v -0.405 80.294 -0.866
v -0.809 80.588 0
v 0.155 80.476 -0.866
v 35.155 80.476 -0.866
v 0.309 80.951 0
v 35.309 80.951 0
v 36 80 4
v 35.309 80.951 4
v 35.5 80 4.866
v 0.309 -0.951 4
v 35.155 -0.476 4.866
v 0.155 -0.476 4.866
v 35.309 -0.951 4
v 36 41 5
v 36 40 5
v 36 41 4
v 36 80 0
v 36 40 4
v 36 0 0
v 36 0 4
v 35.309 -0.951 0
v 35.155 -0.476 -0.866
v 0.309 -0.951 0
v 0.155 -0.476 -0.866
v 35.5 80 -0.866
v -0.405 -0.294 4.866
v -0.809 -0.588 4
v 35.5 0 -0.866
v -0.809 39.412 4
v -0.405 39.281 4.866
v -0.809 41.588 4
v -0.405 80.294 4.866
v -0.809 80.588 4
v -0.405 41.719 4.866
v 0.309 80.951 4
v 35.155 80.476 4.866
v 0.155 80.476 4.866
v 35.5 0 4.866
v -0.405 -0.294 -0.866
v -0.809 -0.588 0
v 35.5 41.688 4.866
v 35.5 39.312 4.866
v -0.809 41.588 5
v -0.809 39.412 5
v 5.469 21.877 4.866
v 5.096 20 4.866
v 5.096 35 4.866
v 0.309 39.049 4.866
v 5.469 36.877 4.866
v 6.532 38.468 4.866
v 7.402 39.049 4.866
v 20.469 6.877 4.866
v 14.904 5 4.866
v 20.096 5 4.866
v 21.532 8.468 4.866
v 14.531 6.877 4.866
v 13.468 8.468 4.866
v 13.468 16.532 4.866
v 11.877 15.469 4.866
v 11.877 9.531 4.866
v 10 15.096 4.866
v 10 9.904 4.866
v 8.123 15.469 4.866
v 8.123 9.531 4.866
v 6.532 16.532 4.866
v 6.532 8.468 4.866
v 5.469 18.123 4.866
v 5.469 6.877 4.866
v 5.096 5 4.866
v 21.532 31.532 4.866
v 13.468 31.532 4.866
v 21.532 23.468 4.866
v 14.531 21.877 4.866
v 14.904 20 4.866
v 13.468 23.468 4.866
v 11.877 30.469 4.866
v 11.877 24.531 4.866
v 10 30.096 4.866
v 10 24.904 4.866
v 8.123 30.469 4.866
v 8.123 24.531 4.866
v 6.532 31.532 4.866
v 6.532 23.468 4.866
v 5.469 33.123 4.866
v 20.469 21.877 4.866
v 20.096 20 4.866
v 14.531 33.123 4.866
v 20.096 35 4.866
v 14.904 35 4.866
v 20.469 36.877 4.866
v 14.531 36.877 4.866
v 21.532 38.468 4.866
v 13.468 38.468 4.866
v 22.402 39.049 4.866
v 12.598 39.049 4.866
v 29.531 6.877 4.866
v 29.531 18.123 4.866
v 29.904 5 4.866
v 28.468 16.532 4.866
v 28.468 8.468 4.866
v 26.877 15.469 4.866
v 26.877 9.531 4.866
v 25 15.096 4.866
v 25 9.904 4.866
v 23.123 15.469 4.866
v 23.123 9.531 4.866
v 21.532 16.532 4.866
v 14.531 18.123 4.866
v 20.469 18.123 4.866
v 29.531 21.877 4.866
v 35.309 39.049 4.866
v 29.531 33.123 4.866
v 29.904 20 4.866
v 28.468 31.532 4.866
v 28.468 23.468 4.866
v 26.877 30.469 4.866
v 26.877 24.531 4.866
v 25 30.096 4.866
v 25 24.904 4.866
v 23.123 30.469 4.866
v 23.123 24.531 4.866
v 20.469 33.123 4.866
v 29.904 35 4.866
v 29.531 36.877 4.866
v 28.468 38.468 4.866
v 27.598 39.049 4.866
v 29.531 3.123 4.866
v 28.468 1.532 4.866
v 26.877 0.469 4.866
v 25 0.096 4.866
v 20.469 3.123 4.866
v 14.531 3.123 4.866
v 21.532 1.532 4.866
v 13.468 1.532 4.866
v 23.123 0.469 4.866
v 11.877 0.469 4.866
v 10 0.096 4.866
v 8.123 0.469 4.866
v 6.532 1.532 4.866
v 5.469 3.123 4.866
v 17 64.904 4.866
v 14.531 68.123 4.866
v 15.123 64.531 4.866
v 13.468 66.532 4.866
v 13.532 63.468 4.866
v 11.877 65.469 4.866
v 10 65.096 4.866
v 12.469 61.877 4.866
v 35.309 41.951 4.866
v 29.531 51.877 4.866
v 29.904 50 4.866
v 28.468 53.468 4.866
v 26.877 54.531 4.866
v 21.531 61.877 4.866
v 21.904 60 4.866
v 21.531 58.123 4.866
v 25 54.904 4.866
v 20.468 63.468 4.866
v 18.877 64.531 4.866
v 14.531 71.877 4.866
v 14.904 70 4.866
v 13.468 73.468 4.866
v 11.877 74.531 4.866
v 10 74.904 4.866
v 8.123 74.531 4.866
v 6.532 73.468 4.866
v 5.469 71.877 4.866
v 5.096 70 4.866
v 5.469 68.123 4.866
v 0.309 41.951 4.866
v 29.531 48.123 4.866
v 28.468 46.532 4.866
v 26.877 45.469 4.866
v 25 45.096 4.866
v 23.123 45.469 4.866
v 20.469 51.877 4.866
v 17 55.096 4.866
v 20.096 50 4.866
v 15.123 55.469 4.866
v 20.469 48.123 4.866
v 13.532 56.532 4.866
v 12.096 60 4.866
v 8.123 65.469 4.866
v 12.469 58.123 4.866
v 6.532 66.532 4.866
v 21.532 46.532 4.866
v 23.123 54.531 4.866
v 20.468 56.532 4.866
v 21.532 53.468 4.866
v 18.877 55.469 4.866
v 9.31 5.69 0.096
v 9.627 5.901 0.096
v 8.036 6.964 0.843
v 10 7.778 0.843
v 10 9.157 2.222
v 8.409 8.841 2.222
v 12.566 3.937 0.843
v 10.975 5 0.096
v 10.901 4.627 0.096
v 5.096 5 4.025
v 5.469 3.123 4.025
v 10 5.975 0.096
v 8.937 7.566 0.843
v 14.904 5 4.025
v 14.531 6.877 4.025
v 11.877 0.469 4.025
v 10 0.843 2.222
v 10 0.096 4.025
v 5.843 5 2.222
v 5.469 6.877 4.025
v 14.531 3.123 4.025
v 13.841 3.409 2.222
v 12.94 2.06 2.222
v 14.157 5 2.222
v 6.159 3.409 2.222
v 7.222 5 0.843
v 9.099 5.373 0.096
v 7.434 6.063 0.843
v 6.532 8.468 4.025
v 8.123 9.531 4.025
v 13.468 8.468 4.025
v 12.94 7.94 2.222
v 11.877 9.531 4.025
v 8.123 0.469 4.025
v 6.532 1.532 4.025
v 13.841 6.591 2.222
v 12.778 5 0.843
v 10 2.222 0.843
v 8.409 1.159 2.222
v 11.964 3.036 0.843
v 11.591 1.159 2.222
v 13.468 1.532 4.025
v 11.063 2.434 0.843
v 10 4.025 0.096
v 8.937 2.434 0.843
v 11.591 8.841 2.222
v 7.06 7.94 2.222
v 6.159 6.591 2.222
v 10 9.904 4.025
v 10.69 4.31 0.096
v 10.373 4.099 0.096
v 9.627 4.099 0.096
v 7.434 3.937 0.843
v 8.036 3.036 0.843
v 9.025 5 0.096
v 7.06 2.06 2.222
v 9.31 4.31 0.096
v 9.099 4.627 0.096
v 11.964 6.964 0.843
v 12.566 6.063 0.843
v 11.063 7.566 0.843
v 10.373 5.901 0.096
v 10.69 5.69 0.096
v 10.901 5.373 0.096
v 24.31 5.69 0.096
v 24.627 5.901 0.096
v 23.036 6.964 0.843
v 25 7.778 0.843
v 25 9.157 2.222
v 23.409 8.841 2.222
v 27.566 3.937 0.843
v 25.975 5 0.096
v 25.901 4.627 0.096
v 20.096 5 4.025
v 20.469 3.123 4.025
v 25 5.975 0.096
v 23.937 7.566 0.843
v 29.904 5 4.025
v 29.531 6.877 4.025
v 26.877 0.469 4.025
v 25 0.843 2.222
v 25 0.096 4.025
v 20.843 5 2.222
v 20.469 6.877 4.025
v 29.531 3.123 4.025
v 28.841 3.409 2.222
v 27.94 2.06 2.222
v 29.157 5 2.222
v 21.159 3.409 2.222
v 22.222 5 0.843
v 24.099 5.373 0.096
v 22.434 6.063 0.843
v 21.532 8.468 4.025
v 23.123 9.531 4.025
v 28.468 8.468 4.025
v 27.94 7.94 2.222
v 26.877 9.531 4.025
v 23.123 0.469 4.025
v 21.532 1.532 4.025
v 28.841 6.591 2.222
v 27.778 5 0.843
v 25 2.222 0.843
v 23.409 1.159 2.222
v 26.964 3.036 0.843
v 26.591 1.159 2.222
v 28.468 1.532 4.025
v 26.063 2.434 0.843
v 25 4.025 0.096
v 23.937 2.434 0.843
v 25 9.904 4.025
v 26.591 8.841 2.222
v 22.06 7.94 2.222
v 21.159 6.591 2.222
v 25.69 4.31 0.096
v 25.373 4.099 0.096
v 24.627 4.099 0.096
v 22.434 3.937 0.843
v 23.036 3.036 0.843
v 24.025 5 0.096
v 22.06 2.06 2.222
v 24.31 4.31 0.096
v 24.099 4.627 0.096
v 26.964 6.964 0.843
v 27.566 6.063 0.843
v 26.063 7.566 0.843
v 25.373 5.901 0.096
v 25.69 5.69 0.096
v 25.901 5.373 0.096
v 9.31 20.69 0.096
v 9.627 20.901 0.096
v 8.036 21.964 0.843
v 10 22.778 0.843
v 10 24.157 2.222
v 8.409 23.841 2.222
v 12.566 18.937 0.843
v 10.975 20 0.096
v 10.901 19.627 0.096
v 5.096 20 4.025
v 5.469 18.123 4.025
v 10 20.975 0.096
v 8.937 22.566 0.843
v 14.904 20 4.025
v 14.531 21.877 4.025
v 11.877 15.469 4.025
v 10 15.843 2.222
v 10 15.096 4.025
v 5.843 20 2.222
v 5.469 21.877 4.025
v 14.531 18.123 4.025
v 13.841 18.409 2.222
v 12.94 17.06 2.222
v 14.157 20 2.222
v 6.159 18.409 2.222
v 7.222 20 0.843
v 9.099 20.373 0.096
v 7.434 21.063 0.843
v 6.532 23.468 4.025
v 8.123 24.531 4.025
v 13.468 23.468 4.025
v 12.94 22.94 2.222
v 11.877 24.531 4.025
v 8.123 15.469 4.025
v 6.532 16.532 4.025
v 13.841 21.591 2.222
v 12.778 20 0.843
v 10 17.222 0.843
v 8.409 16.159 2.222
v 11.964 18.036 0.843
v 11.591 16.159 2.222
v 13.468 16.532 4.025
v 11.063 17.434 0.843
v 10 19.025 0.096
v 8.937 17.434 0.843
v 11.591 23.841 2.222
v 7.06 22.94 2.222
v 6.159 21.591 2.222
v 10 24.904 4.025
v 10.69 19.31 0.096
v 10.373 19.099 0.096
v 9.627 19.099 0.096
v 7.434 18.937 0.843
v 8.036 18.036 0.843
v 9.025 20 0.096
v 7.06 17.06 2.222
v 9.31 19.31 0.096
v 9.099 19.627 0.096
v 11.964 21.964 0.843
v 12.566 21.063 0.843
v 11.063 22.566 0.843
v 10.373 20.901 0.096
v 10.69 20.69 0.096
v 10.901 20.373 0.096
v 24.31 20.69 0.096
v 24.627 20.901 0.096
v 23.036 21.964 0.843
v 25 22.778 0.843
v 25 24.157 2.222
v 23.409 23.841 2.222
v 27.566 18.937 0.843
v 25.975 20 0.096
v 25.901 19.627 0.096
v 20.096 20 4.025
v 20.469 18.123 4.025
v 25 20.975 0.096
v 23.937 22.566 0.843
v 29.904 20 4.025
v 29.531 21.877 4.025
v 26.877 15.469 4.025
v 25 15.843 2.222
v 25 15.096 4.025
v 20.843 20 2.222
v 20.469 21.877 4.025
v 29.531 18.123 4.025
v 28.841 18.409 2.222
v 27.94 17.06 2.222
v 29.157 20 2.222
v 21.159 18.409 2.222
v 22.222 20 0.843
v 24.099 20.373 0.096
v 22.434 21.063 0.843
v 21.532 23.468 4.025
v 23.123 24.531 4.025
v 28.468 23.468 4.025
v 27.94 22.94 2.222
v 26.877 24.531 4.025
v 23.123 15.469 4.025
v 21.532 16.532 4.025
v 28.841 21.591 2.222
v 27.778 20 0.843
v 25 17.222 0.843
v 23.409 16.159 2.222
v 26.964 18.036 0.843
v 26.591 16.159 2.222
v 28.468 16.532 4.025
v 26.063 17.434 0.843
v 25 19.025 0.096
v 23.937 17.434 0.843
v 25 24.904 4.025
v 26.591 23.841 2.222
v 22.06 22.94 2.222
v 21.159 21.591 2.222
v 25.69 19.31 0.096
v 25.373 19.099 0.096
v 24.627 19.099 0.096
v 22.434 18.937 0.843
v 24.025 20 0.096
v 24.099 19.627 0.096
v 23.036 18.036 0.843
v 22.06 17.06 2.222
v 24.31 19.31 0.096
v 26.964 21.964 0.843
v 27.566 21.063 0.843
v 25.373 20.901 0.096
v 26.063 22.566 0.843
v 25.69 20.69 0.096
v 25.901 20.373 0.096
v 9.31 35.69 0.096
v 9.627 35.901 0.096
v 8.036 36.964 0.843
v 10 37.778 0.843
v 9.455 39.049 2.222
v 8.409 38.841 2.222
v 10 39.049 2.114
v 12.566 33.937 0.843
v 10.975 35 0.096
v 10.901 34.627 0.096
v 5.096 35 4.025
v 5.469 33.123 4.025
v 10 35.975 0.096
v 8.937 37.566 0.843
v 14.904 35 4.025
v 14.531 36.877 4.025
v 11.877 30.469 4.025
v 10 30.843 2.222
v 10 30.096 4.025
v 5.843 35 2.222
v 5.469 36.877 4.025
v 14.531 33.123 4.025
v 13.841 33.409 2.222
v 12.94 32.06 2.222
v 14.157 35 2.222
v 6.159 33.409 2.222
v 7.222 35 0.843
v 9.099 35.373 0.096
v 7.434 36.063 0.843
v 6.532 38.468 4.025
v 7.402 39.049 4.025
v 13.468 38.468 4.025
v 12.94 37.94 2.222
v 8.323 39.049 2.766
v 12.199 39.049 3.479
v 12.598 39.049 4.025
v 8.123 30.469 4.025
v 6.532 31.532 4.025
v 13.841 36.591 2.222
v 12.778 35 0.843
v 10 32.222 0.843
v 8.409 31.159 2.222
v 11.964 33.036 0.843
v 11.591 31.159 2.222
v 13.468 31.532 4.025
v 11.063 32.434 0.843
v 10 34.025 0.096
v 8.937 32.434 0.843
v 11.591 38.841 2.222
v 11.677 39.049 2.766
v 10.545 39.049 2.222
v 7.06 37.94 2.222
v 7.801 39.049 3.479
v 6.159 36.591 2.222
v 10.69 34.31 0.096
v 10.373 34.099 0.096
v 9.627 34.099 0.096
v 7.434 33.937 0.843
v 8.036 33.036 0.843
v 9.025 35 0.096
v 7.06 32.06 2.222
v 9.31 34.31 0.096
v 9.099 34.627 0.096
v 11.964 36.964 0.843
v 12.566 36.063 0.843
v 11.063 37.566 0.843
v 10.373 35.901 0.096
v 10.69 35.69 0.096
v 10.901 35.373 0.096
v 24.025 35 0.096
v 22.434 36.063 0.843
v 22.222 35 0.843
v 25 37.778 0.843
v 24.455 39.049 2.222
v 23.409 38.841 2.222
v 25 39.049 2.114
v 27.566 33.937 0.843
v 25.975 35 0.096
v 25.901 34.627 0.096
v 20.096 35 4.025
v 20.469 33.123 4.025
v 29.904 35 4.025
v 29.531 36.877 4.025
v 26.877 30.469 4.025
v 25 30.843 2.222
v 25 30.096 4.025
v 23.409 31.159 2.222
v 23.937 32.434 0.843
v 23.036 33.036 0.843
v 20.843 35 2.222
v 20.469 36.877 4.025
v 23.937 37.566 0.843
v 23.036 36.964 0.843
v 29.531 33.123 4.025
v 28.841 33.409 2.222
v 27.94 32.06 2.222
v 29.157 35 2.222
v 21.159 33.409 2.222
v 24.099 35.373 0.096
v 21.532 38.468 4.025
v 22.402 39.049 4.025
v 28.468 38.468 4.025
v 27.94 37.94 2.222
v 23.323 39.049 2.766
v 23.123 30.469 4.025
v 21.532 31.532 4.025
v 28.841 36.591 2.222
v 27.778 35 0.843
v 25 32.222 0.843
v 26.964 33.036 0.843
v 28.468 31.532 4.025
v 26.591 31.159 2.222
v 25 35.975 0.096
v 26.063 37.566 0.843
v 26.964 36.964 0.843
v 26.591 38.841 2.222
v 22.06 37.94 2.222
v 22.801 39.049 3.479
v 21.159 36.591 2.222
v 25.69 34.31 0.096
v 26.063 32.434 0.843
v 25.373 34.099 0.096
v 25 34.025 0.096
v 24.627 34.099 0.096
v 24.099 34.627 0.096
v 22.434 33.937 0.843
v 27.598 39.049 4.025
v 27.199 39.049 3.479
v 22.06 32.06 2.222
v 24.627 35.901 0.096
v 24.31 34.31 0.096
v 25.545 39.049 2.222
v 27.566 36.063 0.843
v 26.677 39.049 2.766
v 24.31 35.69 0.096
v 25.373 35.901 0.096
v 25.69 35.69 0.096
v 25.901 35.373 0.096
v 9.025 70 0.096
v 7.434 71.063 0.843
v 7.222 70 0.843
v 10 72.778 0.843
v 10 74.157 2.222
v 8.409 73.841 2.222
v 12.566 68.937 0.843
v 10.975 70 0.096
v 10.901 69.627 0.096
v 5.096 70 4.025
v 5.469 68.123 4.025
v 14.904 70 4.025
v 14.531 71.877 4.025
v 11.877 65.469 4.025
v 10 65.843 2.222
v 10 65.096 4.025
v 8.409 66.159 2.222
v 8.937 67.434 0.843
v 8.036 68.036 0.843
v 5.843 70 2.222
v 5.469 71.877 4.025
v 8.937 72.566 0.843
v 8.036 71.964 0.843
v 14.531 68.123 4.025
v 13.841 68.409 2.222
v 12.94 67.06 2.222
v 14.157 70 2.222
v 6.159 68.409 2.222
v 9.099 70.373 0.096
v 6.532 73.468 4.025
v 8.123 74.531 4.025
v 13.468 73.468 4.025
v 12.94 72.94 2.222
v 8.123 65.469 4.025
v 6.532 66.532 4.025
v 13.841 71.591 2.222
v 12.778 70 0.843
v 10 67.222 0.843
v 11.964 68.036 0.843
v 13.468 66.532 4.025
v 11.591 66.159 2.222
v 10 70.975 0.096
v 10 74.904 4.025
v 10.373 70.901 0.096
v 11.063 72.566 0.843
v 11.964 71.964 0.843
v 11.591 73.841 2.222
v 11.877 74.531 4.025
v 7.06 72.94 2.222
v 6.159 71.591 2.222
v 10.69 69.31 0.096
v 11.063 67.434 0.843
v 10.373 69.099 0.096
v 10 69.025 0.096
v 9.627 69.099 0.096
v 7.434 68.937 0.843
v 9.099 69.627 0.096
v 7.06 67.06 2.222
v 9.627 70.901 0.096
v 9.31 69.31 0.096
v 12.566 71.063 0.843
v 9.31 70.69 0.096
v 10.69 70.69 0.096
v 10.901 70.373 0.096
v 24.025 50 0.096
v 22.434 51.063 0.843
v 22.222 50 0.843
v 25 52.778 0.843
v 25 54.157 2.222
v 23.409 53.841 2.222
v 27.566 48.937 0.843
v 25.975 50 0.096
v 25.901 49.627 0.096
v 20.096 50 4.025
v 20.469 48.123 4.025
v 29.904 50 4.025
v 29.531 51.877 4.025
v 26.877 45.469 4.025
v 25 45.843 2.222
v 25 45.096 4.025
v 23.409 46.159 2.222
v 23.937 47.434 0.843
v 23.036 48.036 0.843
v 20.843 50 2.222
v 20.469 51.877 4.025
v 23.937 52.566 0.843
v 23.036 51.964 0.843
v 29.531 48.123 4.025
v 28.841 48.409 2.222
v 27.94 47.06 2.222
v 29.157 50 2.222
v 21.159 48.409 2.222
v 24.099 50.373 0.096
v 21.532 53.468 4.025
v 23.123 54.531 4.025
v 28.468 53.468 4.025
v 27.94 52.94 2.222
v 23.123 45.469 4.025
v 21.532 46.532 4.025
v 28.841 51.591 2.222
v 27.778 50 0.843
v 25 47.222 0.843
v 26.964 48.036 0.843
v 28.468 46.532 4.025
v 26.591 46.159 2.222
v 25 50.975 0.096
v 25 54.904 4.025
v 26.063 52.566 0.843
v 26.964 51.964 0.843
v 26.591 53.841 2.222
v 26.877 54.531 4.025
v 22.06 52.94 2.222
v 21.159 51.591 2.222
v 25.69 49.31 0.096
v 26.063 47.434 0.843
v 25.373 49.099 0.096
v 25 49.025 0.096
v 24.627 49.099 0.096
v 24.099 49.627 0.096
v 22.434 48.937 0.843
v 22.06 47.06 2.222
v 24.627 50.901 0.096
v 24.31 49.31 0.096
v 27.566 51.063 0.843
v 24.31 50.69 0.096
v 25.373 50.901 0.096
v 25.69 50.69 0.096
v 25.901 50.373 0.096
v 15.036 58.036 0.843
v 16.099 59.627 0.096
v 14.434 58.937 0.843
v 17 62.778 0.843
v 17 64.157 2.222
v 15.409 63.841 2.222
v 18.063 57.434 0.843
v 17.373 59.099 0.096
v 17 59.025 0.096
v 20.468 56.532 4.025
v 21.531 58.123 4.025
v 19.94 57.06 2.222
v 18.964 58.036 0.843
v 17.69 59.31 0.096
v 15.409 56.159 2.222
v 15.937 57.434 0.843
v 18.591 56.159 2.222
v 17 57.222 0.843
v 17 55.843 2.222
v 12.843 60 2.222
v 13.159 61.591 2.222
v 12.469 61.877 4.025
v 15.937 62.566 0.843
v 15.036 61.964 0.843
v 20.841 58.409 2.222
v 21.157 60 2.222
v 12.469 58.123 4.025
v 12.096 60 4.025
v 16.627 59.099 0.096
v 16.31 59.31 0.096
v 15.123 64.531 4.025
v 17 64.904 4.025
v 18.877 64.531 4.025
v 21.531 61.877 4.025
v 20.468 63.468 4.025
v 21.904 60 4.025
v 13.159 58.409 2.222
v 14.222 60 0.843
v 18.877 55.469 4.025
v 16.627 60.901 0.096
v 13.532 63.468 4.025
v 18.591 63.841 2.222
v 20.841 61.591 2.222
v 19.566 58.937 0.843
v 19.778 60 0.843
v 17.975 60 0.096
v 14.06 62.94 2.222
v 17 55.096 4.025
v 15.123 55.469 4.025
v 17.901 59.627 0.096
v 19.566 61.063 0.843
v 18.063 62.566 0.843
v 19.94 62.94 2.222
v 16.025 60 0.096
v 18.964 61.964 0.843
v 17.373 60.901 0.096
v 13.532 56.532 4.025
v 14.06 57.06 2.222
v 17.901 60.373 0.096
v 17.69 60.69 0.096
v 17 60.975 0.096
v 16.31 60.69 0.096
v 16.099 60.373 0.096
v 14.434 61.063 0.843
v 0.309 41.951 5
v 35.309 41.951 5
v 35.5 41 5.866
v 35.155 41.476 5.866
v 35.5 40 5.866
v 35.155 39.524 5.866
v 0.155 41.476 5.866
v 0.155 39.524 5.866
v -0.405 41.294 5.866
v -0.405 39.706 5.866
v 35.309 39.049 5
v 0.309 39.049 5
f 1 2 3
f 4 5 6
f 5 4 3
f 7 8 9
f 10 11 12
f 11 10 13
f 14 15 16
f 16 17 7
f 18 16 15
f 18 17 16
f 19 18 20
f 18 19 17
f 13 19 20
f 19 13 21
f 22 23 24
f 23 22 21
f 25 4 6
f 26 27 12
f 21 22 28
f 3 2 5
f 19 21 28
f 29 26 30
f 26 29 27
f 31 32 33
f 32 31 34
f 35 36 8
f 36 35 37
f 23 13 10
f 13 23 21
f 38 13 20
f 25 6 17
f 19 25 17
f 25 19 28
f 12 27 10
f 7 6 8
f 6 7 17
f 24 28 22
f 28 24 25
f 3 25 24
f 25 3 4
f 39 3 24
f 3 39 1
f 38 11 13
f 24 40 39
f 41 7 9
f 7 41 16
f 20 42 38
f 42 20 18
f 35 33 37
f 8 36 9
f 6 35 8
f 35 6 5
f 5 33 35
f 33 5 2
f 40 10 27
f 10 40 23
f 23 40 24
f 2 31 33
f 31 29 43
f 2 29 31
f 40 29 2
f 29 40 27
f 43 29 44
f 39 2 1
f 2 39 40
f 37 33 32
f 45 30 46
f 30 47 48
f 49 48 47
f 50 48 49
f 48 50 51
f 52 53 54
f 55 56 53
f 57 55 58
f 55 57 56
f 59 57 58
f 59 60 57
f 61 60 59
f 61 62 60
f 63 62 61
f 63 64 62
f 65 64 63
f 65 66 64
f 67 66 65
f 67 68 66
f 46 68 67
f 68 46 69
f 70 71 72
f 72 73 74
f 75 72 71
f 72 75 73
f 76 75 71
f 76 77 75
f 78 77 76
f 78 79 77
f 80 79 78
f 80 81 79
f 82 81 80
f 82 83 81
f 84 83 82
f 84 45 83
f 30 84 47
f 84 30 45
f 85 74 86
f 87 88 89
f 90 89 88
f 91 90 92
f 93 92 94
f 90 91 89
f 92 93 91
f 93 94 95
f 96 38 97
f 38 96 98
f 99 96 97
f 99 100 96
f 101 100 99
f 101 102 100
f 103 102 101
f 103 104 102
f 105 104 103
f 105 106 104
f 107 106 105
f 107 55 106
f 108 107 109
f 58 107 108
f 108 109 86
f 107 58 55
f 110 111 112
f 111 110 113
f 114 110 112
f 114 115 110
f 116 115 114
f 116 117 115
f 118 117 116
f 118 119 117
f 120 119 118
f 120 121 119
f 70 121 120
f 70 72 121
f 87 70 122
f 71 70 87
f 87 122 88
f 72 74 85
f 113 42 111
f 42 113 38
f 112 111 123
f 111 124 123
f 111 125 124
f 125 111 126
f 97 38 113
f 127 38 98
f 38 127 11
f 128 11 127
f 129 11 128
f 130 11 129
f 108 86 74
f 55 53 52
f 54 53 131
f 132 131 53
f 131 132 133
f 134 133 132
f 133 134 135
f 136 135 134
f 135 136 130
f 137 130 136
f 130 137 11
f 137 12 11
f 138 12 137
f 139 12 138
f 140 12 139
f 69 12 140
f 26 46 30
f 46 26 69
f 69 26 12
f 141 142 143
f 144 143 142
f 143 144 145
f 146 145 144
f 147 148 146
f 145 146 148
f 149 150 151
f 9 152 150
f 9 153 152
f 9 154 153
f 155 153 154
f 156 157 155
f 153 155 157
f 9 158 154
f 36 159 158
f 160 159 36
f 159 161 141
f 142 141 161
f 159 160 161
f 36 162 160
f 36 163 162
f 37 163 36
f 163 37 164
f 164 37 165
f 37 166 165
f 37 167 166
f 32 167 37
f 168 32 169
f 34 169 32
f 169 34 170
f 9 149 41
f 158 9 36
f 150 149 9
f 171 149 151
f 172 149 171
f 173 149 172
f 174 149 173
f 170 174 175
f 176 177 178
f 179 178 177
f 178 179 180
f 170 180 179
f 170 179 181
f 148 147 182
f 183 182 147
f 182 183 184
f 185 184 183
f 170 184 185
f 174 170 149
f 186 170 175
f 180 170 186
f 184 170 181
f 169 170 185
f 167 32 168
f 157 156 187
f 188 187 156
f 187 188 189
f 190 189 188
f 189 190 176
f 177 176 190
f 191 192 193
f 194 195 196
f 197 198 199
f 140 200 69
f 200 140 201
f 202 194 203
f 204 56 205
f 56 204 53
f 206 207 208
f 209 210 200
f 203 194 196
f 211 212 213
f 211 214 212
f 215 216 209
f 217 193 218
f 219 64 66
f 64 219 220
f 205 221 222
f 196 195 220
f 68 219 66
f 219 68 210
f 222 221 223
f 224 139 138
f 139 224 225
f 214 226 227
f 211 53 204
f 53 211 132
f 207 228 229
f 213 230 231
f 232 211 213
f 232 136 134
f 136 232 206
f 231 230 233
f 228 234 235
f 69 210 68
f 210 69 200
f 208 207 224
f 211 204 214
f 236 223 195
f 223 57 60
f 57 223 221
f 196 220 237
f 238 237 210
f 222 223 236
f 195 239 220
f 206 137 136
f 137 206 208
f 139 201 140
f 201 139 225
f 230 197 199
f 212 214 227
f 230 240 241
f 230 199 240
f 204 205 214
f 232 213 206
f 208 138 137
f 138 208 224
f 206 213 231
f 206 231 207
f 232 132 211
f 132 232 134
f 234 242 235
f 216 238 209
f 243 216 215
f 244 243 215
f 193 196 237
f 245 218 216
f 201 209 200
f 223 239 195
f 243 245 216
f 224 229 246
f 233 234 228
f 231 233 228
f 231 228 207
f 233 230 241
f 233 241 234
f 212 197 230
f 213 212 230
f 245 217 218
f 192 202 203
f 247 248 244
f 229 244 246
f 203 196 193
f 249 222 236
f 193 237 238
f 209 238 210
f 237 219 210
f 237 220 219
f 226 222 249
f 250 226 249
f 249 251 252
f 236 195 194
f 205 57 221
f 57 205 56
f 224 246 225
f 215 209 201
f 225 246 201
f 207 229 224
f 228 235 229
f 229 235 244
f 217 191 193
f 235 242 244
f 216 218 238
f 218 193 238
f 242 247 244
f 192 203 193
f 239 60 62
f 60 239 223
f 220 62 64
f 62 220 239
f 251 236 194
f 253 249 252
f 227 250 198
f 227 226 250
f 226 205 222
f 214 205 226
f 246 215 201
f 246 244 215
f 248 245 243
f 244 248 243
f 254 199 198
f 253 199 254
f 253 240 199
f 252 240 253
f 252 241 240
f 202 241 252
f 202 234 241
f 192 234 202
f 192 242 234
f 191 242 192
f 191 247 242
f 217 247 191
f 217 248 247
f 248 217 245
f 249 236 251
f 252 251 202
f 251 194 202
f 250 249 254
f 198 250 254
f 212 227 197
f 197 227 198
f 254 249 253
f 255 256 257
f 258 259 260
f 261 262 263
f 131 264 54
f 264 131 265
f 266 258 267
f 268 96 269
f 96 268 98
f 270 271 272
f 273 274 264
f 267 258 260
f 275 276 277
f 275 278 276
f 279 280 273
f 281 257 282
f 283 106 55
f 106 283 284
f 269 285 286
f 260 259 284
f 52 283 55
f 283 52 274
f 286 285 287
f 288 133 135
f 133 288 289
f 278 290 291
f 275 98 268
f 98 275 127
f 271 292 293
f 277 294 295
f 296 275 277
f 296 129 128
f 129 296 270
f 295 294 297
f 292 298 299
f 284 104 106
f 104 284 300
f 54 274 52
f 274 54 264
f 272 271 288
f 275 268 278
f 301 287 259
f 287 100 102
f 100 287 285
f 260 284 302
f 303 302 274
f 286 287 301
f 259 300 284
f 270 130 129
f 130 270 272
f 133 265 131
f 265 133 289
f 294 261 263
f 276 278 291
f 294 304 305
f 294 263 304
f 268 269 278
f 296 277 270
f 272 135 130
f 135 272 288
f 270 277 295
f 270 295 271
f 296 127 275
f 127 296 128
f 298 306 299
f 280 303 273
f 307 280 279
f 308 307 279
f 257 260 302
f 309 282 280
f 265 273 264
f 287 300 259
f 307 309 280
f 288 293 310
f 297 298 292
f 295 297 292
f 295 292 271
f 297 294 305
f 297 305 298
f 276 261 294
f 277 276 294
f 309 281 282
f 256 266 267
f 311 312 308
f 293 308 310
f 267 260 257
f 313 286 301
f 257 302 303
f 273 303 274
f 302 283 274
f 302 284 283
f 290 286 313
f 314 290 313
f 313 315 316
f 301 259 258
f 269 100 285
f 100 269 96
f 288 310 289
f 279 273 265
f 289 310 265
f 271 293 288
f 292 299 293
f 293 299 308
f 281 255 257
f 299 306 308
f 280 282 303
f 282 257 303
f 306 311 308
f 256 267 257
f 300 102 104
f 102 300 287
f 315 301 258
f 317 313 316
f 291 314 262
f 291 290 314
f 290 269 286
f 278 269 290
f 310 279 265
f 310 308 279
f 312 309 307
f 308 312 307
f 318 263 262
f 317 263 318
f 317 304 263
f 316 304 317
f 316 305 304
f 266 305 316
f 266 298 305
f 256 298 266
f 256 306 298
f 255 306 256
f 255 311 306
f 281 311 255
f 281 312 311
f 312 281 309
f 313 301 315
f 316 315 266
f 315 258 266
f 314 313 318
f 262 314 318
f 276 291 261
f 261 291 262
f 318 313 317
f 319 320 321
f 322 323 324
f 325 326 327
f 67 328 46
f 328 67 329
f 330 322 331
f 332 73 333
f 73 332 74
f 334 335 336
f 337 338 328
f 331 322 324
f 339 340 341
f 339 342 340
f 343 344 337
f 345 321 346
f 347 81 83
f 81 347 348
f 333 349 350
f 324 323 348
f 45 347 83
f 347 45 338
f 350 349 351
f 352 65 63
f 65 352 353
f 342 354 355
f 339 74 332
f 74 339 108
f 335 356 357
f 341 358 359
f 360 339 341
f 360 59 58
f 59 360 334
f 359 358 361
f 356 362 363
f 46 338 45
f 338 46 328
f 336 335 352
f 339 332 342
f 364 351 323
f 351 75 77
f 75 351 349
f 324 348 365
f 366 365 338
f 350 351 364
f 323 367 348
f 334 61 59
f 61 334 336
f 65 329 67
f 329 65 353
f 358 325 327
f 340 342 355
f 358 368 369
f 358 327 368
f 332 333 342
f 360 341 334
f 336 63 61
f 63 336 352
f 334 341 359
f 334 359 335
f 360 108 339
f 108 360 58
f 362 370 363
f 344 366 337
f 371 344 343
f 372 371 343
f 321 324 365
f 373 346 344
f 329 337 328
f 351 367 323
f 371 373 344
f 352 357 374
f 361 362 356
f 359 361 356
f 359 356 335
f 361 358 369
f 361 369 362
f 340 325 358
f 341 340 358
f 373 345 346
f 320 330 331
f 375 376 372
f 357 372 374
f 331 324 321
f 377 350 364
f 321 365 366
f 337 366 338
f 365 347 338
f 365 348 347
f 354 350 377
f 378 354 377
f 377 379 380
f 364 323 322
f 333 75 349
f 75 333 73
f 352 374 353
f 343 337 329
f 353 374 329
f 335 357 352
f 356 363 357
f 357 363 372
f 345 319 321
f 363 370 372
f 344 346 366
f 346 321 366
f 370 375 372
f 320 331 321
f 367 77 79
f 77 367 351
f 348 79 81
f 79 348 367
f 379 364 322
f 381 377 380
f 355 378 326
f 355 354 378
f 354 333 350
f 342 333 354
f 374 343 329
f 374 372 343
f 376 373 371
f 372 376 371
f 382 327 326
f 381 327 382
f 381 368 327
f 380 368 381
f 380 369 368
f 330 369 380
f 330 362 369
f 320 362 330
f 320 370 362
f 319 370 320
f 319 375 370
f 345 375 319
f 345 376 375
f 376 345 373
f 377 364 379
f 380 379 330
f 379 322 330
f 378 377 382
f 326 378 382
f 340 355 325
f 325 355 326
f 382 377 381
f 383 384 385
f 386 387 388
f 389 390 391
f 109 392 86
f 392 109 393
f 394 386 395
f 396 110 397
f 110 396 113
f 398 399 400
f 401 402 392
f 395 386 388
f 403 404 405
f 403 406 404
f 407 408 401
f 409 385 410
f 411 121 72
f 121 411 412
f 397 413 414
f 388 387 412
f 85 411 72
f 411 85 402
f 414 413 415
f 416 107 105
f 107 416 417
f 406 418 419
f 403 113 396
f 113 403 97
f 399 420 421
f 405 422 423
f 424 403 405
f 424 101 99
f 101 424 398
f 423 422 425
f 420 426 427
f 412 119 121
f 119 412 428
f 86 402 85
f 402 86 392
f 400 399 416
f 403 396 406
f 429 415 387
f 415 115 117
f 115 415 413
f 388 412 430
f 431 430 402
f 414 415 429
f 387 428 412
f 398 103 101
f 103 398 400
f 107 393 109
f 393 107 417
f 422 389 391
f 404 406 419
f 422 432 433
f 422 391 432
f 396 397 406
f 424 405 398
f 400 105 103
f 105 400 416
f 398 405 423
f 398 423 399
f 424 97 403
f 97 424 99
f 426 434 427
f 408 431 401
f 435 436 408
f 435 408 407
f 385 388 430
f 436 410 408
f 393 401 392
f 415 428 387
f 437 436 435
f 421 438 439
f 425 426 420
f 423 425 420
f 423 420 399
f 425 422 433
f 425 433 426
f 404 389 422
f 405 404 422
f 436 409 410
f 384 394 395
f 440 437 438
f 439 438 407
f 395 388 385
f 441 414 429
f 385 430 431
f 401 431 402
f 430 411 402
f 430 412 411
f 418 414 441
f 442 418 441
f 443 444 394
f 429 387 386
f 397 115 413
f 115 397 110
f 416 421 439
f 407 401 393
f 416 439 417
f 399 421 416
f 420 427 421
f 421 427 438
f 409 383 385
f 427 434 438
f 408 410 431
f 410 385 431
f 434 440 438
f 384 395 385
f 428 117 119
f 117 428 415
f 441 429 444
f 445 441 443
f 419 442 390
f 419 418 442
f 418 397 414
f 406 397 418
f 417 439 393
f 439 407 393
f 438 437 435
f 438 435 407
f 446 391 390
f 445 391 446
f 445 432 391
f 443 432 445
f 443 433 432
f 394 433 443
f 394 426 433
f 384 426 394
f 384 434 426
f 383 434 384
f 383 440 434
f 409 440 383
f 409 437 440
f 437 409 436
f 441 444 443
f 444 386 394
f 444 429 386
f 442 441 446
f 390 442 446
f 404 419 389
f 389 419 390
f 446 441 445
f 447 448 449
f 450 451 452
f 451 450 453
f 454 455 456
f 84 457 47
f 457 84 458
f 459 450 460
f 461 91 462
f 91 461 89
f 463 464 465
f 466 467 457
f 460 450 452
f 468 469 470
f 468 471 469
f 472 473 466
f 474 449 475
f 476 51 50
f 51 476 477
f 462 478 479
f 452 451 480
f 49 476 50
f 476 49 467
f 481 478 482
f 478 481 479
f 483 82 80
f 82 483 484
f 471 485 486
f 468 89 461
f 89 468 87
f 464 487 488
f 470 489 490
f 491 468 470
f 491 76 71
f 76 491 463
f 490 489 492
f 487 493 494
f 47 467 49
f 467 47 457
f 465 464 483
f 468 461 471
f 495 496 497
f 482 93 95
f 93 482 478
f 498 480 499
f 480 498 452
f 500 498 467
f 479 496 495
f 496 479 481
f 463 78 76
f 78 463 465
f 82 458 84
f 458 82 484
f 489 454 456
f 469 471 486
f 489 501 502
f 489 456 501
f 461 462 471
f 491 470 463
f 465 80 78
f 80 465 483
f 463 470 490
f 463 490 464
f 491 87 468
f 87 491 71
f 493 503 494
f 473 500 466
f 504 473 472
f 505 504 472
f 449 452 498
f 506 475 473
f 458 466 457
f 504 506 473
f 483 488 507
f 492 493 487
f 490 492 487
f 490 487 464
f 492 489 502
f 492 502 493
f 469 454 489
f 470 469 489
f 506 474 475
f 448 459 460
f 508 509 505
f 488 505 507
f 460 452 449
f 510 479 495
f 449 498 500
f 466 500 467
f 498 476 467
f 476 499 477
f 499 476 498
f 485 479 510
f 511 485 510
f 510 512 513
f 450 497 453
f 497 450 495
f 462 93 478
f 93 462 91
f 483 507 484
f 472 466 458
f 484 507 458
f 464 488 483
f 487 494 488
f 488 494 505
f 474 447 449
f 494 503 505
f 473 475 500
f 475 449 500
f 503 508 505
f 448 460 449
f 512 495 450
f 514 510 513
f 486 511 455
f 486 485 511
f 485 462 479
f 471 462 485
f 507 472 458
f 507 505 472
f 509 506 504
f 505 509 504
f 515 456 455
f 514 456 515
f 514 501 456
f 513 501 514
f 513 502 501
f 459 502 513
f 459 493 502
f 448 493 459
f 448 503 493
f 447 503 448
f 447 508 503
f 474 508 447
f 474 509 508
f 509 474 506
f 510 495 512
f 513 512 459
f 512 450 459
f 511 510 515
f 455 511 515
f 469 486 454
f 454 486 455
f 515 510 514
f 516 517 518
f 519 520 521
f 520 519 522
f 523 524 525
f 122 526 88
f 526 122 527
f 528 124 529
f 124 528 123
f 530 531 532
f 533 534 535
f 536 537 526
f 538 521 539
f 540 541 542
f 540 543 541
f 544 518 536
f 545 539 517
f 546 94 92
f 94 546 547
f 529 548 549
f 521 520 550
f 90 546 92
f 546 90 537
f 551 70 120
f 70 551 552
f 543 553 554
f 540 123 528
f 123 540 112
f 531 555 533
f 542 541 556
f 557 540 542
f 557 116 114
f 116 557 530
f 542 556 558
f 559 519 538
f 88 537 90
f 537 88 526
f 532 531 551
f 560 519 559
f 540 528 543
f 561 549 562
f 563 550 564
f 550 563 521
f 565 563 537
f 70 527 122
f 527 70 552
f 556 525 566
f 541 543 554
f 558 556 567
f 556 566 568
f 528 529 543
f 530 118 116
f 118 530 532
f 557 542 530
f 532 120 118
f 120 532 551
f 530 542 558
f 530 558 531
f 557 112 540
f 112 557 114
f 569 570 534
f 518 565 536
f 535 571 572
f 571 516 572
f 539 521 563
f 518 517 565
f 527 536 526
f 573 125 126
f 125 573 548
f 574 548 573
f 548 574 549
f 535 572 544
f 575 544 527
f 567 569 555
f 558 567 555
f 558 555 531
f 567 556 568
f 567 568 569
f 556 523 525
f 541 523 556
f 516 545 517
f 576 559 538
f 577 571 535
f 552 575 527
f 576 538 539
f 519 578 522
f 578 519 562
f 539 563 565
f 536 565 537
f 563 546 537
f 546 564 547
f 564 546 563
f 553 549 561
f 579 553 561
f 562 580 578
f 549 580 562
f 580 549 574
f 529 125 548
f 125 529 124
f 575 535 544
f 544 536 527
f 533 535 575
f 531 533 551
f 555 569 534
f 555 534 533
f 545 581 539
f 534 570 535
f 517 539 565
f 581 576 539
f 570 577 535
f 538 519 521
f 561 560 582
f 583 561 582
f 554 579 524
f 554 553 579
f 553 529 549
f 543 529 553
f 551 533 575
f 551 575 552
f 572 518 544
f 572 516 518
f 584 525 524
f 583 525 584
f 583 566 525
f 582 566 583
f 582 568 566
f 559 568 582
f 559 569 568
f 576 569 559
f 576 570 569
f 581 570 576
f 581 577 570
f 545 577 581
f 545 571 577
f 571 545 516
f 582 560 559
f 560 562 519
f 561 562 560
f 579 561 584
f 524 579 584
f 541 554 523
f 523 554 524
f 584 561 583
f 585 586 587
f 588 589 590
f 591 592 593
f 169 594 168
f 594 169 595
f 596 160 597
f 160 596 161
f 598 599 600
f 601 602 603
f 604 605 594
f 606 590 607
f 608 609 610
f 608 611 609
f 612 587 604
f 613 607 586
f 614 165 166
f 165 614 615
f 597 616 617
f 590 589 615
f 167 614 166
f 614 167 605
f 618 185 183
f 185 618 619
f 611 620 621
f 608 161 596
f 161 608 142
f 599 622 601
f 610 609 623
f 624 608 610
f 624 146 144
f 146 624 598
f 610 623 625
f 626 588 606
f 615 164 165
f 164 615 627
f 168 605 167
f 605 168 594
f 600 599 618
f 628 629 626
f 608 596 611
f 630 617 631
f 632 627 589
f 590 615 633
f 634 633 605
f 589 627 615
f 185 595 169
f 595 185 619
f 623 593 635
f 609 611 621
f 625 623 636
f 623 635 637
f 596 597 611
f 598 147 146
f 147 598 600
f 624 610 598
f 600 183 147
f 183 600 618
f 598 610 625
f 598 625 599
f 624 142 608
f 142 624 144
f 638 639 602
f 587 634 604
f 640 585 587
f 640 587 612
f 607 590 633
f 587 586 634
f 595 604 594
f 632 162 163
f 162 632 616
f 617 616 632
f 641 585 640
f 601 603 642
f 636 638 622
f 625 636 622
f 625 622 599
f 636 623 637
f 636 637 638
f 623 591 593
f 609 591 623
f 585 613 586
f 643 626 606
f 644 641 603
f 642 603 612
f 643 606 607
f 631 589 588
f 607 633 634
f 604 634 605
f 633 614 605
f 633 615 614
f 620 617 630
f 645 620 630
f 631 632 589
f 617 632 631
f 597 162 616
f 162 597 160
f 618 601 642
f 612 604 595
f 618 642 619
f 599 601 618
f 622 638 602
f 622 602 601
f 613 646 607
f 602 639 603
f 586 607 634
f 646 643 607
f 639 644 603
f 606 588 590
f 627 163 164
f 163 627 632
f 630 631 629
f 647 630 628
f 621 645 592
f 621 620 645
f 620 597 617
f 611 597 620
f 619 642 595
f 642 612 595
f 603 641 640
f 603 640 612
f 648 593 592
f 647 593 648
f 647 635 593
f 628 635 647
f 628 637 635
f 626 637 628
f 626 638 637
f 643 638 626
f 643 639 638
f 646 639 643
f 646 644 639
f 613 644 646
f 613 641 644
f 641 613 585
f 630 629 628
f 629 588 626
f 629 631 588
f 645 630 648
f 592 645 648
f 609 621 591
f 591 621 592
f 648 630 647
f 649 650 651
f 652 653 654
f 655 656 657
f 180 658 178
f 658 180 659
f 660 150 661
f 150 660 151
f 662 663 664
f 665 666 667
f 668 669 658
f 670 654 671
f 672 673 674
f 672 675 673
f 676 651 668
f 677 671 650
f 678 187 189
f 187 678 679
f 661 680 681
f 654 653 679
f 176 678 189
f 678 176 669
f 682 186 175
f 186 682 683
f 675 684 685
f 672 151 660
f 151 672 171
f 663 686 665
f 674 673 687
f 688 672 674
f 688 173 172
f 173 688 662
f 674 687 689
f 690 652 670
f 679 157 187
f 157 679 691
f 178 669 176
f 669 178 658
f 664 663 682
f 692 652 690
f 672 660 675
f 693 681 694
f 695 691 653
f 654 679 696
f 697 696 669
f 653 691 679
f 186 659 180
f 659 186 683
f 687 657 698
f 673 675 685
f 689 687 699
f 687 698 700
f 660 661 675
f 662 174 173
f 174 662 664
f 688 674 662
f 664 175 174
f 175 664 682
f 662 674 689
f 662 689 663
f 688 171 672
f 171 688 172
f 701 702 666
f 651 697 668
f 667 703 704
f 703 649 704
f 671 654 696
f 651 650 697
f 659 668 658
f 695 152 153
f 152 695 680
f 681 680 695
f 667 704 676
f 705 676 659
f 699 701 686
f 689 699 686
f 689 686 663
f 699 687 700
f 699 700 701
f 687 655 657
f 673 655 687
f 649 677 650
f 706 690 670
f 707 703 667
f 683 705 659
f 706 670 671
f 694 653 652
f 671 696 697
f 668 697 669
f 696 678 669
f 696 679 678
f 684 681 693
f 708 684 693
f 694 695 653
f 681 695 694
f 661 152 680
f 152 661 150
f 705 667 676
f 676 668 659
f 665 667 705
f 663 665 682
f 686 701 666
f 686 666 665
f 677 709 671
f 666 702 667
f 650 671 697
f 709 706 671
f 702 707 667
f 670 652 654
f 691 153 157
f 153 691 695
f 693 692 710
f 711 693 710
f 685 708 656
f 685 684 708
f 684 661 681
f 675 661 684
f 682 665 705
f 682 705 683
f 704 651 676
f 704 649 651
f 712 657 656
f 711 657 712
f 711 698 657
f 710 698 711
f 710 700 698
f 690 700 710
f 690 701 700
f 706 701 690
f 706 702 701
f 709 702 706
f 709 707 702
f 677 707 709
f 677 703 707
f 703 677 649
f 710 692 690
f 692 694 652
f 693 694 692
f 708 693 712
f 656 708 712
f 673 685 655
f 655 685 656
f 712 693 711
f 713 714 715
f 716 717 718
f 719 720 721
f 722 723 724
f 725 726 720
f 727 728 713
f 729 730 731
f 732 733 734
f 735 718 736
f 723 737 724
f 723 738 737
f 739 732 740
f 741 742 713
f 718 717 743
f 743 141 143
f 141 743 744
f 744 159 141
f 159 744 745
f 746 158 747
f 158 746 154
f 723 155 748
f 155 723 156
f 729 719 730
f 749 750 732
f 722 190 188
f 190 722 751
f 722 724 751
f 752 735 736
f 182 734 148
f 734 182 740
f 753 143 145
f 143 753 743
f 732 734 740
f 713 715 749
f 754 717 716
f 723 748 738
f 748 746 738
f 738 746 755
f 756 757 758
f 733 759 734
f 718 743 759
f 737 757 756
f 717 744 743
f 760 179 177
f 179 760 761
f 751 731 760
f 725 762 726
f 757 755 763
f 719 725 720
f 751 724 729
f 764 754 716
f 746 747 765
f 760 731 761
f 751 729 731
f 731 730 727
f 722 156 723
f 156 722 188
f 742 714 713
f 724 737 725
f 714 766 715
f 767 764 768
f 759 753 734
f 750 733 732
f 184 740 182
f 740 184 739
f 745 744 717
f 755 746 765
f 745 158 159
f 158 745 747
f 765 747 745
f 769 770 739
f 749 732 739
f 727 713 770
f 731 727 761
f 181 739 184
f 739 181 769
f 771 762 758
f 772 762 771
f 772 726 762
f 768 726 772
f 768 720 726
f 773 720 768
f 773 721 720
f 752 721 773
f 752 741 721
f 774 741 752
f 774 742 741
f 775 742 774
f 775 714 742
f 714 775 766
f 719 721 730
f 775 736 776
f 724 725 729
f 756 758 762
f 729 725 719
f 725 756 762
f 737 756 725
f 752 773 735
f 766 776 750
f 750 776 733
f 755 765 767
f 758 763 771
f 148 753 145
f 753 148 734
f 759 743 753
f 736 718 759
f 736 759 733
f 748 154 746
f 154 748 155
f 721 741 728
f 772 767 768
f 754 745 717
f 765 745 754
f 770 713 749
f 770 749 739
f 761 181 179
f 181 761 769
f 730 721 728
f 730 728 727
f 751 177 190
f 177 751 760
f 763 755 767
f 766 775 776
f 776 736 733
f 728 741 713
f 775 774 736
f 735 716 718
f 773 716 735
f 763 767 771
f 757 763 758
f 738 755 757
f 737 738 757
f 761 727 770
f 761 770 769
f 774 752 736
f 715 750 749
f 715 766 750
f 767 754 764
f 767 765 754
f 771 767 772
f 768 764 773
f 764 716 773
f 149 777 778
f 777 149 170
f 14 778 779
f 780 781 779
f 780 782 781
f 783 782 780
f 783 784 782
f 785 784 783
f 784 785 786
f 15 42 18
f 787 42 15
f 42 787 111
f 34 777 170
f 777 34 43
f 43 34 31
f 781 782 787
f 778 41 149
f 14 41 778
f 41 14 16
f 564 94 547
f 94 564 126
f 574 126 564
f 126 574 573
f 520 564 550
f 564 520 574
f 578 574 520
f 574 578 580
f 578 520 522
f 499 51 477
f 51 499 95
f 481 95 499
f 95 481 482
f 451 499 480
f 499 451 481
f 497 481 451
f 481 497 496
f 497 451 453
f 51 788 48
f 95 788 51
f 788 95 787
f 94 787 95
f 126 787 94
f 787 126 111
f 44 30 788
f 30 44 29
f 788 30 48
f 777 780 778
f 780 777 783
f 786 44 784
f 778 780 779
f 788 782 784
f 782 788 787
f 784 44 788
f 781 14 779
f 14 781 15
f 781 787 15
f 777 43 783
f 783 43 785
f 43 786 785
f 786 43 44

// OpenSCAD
// Loguncov Maxim 13.12.13


//$fn=128;


translate([0,40,0])
minkowski()
{cube([35,1,5]);
sphere(1);
}

difference() {

//основа
minkowski()
{cube([35,80,4]);
sphere(1);
}

//отверстия
translate([10,5,5])sphere(5);
translate([25,5,5])sphere(5);
translate([10,20,5])sphere(5);
translate([25,20,5])sphere(5);
translate([10,35,5])sphere(5);
translate([25,35,5])sphere(5);

translate([10,70,5])sphere(5);
translate([25,50,5])sphere(5);
translate([17,60,5])sphere(5);


}
